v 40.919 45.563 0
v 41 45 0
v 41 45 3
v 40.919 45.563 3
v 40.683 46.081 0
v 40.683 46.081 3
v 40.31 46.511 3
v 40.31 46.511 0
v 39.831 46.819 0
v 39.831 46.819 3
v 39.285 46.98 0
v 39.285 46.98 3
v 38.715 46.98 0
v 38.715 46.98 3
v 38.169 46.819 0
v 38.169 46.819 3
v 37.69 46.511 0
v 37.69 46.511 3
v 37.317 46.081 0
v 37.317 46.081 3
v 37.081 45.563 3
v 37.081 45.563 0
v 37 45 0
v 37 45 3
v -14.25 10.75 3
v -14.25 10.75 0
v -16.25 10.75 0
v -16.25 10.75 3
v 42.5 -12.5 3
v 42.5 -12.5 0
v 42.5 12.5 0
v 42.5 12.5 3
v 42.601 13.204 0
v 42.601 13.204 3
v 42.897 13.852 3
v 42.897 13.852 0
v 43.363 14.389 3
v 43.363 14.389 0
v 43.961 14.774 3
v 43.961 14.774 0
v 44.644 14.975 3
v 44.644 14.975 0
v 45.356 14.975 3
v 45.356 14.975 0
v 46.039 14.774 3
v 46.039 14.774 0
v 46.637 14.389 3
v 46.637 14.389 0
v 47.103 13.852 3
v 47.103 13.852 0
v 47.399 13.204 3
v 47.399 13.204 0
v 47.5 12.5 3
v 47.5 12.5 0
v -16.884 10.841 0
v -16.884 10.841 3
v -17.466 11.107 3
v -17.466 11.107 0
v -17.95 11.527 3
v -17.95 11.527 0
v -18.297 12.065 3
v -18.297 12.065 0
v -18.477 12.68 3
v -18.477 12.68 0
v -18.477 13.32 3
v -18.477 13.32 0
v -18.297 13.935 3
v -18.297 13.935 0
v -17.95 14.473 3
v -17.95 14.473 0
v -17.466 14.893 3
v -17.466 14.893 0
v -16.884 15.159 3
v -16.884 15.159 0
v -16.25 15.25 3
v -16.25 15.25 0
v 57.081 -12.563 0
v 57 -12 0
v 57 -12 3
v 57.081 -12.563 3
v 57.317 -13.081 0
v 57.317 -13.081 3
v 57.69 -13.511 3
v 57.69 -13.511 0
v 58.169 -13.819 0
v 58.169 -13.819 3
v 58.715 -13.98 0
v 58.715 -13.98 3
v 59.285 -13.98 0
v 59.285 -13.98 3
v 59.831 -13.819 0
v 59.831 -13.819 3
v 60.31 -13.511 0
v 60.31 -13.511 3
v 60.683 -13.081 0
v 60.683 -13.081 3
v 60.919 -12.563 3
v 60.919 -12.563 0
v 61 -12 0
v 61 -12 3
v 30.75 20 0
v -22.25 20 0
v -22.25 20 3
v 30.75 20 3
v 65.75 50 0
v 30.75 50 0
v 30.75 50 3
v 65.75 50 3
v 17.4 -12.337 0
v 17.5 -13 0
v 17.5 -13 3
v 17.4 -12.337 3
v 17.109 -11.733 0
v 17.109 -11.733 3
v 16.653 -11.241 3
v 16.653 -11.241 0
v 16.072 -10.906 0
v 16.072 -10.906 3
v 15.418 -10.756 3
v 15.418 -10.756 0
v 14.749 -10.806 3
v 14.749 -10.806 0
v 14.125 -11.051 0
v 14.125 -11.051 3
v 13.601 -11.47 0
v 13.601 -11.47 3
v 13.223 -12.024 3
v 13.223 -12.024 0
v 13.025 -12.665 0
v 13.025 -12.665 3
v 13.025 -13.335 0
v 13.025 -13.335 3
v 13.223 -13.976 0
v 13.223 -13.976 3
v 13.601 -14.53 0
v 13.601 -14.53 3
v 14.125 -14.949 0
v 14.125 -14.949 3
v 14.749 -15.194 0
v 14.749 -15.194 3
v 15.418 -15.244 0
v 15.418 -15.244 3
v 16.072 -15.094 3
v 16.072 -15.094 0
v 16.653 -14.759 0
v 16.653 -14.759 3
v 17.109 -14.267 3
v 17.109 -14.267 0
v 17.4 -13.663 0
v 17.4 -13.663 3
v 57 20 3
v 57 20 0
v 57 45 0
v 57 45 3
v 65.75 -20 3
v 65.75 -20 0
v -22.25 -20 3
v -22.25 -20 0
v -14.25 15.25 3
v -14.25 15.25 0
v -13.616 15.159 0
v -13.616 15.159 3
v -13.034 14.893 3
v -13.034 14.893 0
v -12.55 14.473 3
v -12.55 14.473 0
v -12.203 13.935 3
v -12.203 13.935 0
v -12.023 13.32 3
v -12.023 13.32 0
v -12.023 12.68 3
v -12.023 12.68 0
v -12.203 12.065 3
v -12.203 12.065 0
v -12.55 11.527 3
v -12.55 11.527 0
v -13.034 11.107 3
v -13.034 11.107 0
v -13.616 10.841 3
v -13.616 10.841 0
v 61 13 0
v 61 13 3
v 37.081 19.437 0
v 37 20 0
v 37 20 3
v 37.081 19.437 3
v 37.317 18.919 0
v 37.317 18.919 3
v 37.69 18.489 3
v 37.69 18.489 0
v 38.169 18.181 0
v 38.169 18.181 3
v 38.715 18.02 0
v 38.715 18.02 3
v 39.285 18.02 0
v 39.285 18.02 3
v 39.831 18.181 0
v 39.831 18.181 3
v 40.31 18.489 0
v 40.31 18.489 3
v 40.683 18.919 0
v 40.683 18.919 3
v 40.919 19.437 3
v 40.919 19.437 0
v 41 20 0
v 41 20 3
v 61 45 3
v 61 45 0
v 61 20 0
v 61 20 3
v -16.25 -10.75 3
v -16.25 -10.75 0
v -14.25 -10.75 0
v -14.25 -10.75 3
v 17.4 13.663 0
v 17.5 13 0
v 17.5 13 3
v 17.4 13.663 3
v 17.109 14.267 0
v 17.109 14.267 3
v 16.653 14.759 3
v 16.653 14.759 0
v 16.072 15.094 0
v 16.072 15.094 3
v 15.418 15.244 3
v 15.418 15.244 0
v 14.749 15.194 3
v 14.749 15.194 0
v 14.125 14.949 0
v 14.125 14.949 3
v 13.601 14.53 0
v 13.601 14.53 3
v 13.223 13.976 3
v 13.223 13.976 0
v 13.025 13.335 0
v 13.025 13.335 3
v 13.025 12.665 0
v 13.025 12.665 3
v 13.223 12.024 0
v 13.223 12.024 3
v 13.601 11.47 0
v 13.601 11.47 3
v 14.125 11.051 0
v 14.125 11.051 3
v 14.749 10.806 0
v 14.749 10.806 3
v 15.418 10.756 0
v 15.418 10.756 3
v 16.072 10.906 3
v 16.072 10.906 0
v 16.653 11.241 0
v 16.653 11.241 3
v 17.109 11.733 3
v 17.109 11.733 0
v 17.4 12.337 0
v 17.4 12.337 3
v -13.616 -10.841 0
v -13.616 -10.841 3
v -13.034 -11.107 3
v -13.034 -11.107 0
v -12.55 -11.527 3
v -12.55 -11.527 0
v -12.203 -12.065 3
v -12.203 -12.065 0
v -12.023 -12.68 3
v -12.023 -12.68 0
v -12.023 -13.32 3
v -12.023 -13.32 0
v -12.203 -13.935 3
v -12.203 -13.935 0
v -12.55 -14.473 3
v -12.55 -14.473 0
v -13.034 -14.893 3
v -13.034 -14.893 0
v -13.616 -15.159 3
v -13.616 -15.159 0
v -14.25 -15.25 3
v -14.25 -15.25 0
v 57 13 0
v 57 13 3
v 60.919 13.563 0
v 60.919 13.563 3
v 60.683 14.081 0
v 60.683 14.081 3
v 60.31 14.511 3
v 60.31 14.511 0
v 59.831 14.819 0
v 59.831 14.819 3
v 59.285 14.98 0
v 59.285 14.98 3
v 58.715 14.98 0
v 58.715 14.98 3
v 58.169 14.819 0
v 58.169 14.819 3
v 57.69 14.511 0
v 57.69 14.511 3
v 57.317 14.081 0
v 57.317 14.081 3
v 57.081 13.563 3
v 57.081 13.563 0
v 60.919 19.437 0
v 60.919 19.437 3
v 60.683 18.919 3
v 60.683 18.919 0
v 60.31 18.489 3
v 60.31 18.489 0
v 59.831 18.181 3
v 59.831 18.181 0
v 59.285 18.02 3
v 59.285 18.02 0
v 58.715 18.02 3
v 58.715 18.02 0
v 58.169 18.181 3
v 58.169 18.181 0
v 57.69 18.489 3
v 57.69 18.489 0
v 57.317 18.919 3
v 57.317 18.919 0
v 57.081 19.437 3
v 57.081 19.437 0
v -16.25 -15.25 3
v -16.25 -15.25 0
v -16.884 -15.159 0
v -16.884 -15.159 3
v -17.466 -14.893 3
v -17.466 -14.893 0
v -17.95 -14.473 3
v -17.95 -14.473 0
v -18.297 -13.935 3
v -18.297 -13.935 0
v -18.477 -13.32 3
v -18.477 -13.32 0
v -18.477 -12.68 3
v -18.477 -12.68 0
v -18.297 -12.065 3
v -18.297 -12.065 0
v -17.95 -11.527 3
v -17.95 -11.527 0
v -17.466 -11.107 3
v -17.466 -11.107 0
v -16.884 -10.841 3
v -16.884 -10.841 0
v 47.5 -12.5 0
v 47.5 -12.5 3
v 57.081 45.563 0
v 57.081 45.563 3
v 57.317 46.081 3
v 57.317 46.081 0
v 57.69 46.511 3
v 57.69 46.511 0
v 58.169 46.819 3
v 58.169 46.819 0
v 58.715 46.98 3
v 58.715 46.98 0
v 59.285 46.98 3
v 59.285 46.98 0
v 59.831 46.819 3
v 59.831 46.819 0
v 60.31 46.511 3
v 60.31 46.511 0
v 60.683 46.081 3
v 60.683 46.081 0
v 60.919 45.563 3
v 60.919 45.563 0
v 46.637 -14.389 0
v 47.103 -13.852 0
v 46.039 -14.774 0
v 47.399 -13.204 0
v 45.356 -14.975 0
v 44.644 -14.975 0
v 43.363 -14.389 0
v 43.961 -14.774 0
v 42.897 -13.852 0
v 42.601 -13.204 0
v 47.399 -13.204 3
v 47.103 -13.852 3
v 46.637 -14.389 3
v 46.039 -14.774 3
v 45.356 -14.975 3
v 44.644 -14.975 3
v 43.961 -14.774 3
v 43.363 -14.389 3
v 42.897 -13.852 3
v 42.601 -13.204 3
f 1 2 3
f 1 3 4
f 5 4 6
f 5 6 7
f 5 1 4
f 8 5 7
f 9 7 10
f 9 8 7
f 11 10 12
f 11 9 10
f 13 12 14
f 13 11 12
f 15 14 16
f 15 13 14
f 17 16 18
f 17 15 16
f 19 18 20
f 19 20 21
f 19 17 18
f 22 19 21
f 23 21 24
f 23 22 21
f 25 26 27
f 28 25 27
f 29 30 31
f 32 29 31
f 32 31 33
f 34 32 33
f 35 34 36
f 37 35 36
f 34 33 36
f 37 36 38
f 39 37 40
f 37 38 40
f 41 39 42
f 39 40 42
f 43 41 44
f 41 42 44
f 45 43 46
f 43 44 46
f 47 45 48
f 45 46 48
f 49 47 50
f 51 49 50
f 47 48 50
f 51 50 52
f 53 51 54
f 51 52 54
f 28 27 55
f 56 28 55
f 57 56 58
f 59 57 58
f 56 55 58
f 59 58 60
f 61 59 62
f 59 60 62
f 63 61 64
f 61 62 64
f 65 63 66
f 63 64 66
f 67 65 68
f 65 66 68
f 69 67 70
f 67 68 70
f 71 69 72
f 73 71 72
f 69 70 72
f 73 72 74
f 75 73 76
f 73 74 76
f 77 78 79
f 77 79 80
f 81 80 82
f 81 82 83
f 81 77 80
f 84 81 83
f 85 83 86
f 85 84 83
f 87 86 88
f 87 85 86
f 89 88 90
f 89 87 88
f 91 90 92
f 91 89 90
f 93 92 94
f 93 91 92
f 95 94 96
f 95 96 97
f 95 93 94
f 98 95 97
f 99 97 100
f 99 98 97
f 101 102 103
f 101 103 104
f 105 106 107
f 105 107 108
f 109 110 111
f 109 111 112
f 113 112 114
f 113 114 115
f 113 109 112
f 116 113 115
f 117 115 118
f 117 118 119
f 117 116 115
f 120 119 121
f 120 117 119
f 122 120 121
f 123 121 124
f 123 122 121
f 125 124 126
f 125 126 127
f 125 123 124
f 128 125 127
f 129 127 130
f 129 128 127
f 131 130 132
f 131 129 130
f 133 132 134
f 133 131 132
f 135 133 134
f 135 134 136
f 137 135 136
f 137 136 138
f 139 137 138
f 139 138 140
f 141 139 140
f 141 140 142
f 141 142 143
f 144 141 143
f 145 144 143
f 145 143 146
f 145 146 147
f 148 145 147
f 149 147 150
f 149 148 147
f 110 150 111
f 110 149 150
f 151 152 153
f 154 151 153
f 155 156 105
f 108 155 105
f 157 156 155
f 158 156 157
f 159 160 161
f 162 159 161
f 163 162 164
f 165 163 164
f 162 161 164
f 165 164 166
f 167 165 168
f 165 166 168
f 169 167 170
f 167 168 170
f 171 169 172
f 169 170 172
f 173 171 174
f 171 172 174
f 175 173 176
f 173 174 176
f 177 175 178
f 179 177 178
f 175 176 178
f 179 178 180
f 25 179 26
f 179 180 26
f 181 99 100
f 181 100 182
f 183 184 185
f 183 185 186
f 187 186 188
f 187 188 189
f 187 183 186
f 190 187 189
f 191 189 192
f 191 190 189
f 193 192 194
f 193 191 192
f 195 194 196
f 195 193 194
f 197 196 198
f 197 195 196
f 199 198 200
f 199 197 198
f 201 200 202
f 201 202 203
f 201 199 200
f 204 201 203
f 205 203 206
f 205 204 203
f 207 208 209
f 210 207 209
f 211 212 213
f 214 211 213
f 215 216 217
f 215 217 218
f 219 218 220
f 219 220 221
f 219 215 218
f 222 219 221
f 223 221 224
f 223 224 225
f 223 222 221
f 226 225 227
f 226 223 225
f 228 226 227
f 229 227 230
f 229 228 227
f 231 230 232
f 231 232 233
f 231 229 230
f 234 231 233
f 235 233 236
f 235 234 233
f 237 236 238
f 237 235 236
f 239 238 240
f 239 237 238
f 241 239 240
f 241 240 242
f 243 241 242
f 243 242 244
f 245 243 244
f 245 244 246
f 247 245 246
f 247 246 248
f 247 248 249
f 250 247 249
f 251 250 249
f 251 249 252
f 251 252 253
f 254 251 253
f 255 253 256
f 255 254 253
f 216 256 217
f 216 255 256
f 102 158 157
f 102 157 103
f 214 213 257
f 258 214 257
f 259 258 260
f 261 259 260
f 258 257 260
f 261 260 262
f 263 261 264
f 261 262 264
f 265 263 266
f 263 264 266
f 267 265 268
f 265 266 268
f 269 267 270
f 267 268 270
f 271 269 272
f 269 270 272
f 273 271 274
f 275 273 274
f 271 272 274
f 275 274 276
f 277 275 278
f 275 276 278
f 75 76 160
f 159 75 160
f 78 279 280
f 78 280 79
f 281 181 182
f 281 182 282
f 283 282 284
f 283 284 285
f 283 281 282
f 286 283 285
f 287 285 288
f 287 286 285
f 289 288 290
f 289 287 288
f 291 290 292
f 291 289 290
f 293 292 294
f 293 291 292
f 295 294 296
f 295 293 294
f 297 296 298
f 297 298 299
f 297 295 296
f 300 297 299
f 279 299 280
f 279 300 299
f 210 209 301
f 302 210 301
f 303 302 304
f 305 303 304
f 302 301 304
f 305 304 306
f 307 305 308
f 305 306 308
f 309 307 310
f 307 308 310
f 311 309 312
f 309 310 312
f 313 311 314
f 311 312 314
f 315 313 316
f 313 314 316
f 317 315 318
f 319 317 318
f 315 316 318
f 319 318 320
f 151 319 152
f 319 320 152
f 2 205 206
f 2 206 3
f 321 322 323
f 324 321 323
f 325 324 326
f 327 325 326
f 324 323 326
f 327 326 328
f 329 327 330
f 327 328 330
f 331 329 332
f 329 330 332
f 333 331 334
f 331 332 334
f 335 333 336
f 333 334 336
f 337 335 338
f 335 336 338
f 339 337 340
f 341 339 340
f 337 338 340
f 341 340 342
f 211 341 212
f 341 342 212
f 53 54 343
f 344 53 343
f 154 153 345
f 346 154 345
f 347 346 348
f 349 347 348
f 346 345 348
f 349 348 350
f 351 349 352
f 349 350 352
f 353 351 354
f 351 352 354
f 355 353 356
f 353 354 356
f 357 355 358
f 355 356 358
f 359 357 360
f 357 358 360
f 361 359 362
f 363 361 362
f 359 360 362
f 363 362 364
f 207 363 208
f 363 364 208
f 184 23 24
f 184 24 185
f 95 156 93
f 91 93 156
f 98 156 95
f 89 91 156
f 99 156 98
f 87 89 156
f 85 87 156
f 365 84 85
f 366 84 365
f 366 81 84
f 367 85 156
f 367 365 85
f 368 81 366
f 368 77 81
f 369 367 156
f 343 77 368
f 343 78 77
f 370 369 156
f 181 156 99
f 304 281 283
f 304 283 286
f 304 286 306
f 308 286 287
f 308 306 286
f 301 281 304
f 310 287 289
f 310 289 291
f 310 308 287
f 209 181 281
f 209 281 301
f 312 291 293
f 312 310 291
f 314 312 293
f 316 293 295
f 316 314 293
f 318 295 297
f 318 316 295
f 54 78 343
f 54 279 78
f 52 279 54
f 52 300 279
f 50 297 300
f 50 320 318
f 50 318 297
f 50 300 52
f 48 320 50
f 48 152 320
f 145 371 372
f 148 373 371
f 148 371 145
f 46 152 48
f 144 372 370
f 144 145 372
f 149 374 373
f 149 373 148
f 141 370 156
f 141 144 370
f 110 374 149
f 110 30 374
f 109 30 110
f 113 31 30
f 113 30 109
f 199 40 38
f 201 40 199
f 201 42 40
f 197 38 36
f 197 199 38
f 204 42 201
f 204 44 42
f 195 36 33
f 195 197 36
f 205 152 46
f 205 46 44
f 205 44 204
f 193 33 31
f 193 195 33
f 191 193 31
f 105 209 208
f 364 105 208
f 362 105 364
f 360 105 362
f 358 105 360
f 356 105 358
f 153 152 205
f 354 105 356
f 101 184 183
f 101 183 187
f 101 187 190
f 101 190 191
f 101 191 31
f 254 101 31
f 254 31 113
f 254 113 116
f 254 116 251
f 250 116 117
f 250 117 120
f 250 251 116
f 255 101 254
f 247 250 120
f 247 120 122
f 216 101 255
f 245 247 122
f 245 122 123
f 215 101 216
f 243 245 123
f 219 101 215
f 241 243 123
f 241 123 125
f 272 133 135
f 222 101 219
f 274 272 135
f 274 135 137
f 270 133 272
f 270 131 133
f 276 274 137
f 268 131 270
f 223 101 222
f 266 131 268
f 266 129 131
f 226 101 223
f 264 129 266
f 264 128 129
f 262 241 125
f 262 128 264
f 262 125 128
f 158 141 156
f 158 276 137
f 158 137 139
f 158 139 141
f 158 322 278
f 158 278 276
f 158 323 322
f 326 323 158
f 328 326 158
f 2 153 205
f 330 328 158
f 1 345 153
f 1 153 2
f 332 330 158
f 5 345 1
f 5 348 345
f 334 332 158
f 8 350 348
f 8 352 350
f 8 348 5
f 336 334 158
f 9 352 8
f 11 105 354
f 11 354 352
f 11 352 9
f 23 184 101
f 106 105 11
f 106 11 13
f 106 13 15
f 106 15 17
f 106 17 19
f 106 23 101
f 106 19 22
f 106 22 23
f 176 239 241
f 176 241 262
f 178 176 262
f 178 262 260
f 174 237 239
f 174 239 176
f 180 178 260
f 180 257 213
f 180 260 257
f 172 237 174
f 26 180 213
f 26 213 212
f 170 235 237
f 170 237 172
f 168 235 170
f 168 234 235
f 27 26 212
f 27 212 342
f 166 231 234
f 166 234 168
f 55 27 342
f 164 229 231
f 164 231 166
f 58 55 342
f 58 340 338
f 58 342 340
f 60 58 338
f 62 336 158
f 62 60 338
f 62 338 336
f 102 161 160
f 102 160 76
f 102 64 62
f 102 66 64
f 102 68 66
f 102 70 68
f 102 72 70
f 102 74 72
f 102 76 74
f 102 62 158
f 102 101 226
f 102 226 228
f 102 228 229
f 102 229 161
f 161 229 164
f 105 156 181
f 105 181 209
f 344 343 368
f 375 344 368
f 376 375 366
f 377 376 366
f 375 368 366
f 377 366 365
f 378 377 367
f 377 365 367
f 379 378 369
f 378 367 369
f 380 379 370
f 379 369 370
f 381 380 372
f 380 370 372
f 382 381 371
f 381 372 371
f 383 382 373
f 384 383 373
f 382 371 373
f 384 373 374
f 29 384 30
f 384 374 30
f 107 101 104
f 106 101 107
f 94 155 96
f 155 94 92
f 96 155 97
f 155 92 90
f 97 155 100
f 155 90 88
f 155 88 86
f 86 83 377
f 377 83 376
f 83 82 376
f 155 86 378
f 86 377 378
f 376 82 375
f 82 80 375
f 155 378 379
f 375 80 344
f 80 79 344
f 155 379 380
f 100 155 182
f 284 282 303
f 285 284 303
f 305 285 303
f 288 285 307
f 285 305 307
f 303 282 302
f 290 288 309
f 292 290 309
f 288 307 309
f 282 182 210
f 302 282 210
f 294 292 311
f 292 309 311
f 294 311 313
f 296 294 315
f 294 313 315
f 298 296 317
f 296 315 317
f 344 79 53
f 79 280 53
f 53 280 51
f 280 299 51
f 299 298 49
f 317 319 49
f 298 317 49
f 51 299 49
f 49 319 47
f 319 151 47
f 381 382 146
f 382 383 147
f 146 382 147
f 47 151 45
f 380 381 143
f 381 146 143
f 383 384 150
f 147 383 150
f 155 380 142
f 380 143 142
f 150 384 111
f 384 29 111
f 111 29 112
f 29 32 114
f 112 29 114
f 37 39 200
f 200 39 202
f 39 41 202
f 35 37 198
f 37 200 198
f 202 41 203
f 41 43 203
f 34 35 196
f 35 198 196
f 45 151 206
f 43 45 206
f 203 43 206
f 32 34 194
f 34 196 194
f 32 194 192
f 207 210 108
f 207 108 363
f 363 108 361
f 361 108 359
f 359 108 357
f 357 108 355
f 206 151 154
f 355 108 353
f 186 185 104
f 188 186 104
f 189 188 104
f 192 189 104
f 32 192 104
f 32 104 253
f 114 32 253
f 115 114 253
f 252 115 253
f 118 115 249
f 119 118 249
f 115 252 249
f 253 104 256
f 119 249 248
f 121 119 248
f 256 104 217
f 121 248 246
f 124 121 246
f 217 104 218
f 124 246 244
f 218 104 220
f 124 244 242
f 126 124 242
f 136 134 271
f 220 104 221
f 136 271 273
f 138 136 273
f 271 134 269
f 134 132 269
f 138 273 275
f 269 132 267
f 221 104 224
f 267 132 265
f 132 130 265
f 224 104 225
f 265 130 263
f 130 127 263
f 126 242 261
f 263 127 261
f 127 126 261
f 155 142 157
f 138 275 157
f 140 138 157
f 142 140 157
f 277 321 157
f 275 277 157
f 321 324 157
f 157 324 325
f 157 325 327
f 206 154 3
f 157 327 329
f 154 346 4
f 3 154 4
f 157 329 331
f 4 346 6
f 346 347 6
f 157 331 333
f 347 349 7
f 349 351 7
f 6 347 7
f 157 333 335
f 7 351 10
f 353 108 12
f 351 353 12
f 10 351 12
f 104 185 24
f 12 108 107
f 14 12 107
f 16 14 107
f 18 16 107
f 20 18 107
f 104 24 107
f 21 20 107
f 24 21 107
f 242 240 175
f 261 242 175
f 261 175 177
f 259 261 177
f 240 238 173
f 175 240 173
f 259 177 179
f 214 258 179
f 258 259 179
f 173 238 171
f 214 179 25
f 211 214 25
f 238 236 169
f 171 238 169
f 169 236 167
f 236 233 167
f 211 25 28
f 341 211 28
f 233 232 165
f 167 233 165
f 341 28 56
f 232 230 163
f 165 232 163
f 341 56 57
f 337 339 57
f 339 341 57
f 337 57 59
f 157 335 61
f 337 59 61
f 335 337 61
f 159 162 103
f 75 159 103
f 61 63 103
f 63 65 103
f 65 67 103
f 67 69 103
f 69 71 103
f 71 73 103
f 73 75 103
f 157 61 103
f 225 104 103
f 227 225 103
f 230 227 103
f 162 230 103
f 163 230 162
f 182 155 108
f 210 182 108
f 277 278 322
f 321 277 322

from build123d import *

# Parameters (mm, degrees)
SKETCH_1_R      = 2.25
EXTRUDE_1_DEPTH = 3


with BuildPart() as part:
    # 草图1 → 凸台-拉伸1 (new body)
    with BuildSketch(Plane.XY):
        Polygon((65.75, -20), (-22.25, -20), (-22.25, 20), (30.75, 20), (30.75, 50), (65.75, 50), (65.75, 20), align=None)
        with Locations((15.25, 13)):
            Circle(SKETCH_1_R, mode=Mode.SUBTRACT)
        with Locations((15.25, -13)):
            Circle(SKETCH_1_R, mode=Mode.SUBTRACT)
        with BuildLine():
            Line((-14.25, 10.75), (-16.25, 10.75))
            ThreePointArc((-16.25, 10.75), (-18.5, 13), (-16.25, 15.25))
            Line((-16.25, 15.25), (-14.25, 15.25))
            ThreePointArc((-14.25, 15.25), (-12, 13), (-14.25, 10.75))
        make_face(mode=Mode.SUBTRACT)
        with BuildLine():
            Line((-14.25, -15.25), (-16.25, -15.25))
            ThreePointArc((-16.25, -15.25), (-18.5, -13), (-16.25, -10.75))
            Line((-16.25, -10.75), (-14.25, -10.75))
            ThreePointArc((-14.25, -10.75), (-12, -13), (-14.25, -15.25))
        make_face(mode=Mode.SUBTRACT)
        with BuildLine():
            Line((42.5, -12.5), (42.5, 12.5))
            ThreePointArc((42.5, 12.5), (45, 15), (47.5, 12.5))
            Line((47.5, 12.5), (47.5, -12.5))
            ThreePointArc((47.5, -12.5), (45, -15), (42.5, -12.5))
        make_face(mode=Mode.SUBTRACT)
        with BuildLine():
            Line((57, 20), (57, 45))
            ThreePointArc((57, 45), (59, 47), (61, 45))
            Line((61, 45), (61, 20))
            ThreePointArc((61, 20), (59, 18), (57, 20))
        make_face(mode=Mode.SUBTRACT)
        with BuildLine():
            Line((61, -12), (61, 13))
            ThreePointArc((61, 13), (59, 15), (57, 13))
            Line((57, 13), (57, -12))
            ThreePointArc((57, -12), (59, -14), (61, -12))
        make_face(mode=Mode.SUBTRACT)
        with BuildLine():
            Line((41, 20), (41, 45))
            ThreePointArc((41, 45), (39, 47), (37, 45))
            Line((37, 45), (37, 20))
            ThreePointArc((37, 20), (39, 18), (41, 20))
        make_face(mode=Mode.SUBTRACT)
    extrude(amount=EXTRUDE_1_DEPTH)


solid = part.part
